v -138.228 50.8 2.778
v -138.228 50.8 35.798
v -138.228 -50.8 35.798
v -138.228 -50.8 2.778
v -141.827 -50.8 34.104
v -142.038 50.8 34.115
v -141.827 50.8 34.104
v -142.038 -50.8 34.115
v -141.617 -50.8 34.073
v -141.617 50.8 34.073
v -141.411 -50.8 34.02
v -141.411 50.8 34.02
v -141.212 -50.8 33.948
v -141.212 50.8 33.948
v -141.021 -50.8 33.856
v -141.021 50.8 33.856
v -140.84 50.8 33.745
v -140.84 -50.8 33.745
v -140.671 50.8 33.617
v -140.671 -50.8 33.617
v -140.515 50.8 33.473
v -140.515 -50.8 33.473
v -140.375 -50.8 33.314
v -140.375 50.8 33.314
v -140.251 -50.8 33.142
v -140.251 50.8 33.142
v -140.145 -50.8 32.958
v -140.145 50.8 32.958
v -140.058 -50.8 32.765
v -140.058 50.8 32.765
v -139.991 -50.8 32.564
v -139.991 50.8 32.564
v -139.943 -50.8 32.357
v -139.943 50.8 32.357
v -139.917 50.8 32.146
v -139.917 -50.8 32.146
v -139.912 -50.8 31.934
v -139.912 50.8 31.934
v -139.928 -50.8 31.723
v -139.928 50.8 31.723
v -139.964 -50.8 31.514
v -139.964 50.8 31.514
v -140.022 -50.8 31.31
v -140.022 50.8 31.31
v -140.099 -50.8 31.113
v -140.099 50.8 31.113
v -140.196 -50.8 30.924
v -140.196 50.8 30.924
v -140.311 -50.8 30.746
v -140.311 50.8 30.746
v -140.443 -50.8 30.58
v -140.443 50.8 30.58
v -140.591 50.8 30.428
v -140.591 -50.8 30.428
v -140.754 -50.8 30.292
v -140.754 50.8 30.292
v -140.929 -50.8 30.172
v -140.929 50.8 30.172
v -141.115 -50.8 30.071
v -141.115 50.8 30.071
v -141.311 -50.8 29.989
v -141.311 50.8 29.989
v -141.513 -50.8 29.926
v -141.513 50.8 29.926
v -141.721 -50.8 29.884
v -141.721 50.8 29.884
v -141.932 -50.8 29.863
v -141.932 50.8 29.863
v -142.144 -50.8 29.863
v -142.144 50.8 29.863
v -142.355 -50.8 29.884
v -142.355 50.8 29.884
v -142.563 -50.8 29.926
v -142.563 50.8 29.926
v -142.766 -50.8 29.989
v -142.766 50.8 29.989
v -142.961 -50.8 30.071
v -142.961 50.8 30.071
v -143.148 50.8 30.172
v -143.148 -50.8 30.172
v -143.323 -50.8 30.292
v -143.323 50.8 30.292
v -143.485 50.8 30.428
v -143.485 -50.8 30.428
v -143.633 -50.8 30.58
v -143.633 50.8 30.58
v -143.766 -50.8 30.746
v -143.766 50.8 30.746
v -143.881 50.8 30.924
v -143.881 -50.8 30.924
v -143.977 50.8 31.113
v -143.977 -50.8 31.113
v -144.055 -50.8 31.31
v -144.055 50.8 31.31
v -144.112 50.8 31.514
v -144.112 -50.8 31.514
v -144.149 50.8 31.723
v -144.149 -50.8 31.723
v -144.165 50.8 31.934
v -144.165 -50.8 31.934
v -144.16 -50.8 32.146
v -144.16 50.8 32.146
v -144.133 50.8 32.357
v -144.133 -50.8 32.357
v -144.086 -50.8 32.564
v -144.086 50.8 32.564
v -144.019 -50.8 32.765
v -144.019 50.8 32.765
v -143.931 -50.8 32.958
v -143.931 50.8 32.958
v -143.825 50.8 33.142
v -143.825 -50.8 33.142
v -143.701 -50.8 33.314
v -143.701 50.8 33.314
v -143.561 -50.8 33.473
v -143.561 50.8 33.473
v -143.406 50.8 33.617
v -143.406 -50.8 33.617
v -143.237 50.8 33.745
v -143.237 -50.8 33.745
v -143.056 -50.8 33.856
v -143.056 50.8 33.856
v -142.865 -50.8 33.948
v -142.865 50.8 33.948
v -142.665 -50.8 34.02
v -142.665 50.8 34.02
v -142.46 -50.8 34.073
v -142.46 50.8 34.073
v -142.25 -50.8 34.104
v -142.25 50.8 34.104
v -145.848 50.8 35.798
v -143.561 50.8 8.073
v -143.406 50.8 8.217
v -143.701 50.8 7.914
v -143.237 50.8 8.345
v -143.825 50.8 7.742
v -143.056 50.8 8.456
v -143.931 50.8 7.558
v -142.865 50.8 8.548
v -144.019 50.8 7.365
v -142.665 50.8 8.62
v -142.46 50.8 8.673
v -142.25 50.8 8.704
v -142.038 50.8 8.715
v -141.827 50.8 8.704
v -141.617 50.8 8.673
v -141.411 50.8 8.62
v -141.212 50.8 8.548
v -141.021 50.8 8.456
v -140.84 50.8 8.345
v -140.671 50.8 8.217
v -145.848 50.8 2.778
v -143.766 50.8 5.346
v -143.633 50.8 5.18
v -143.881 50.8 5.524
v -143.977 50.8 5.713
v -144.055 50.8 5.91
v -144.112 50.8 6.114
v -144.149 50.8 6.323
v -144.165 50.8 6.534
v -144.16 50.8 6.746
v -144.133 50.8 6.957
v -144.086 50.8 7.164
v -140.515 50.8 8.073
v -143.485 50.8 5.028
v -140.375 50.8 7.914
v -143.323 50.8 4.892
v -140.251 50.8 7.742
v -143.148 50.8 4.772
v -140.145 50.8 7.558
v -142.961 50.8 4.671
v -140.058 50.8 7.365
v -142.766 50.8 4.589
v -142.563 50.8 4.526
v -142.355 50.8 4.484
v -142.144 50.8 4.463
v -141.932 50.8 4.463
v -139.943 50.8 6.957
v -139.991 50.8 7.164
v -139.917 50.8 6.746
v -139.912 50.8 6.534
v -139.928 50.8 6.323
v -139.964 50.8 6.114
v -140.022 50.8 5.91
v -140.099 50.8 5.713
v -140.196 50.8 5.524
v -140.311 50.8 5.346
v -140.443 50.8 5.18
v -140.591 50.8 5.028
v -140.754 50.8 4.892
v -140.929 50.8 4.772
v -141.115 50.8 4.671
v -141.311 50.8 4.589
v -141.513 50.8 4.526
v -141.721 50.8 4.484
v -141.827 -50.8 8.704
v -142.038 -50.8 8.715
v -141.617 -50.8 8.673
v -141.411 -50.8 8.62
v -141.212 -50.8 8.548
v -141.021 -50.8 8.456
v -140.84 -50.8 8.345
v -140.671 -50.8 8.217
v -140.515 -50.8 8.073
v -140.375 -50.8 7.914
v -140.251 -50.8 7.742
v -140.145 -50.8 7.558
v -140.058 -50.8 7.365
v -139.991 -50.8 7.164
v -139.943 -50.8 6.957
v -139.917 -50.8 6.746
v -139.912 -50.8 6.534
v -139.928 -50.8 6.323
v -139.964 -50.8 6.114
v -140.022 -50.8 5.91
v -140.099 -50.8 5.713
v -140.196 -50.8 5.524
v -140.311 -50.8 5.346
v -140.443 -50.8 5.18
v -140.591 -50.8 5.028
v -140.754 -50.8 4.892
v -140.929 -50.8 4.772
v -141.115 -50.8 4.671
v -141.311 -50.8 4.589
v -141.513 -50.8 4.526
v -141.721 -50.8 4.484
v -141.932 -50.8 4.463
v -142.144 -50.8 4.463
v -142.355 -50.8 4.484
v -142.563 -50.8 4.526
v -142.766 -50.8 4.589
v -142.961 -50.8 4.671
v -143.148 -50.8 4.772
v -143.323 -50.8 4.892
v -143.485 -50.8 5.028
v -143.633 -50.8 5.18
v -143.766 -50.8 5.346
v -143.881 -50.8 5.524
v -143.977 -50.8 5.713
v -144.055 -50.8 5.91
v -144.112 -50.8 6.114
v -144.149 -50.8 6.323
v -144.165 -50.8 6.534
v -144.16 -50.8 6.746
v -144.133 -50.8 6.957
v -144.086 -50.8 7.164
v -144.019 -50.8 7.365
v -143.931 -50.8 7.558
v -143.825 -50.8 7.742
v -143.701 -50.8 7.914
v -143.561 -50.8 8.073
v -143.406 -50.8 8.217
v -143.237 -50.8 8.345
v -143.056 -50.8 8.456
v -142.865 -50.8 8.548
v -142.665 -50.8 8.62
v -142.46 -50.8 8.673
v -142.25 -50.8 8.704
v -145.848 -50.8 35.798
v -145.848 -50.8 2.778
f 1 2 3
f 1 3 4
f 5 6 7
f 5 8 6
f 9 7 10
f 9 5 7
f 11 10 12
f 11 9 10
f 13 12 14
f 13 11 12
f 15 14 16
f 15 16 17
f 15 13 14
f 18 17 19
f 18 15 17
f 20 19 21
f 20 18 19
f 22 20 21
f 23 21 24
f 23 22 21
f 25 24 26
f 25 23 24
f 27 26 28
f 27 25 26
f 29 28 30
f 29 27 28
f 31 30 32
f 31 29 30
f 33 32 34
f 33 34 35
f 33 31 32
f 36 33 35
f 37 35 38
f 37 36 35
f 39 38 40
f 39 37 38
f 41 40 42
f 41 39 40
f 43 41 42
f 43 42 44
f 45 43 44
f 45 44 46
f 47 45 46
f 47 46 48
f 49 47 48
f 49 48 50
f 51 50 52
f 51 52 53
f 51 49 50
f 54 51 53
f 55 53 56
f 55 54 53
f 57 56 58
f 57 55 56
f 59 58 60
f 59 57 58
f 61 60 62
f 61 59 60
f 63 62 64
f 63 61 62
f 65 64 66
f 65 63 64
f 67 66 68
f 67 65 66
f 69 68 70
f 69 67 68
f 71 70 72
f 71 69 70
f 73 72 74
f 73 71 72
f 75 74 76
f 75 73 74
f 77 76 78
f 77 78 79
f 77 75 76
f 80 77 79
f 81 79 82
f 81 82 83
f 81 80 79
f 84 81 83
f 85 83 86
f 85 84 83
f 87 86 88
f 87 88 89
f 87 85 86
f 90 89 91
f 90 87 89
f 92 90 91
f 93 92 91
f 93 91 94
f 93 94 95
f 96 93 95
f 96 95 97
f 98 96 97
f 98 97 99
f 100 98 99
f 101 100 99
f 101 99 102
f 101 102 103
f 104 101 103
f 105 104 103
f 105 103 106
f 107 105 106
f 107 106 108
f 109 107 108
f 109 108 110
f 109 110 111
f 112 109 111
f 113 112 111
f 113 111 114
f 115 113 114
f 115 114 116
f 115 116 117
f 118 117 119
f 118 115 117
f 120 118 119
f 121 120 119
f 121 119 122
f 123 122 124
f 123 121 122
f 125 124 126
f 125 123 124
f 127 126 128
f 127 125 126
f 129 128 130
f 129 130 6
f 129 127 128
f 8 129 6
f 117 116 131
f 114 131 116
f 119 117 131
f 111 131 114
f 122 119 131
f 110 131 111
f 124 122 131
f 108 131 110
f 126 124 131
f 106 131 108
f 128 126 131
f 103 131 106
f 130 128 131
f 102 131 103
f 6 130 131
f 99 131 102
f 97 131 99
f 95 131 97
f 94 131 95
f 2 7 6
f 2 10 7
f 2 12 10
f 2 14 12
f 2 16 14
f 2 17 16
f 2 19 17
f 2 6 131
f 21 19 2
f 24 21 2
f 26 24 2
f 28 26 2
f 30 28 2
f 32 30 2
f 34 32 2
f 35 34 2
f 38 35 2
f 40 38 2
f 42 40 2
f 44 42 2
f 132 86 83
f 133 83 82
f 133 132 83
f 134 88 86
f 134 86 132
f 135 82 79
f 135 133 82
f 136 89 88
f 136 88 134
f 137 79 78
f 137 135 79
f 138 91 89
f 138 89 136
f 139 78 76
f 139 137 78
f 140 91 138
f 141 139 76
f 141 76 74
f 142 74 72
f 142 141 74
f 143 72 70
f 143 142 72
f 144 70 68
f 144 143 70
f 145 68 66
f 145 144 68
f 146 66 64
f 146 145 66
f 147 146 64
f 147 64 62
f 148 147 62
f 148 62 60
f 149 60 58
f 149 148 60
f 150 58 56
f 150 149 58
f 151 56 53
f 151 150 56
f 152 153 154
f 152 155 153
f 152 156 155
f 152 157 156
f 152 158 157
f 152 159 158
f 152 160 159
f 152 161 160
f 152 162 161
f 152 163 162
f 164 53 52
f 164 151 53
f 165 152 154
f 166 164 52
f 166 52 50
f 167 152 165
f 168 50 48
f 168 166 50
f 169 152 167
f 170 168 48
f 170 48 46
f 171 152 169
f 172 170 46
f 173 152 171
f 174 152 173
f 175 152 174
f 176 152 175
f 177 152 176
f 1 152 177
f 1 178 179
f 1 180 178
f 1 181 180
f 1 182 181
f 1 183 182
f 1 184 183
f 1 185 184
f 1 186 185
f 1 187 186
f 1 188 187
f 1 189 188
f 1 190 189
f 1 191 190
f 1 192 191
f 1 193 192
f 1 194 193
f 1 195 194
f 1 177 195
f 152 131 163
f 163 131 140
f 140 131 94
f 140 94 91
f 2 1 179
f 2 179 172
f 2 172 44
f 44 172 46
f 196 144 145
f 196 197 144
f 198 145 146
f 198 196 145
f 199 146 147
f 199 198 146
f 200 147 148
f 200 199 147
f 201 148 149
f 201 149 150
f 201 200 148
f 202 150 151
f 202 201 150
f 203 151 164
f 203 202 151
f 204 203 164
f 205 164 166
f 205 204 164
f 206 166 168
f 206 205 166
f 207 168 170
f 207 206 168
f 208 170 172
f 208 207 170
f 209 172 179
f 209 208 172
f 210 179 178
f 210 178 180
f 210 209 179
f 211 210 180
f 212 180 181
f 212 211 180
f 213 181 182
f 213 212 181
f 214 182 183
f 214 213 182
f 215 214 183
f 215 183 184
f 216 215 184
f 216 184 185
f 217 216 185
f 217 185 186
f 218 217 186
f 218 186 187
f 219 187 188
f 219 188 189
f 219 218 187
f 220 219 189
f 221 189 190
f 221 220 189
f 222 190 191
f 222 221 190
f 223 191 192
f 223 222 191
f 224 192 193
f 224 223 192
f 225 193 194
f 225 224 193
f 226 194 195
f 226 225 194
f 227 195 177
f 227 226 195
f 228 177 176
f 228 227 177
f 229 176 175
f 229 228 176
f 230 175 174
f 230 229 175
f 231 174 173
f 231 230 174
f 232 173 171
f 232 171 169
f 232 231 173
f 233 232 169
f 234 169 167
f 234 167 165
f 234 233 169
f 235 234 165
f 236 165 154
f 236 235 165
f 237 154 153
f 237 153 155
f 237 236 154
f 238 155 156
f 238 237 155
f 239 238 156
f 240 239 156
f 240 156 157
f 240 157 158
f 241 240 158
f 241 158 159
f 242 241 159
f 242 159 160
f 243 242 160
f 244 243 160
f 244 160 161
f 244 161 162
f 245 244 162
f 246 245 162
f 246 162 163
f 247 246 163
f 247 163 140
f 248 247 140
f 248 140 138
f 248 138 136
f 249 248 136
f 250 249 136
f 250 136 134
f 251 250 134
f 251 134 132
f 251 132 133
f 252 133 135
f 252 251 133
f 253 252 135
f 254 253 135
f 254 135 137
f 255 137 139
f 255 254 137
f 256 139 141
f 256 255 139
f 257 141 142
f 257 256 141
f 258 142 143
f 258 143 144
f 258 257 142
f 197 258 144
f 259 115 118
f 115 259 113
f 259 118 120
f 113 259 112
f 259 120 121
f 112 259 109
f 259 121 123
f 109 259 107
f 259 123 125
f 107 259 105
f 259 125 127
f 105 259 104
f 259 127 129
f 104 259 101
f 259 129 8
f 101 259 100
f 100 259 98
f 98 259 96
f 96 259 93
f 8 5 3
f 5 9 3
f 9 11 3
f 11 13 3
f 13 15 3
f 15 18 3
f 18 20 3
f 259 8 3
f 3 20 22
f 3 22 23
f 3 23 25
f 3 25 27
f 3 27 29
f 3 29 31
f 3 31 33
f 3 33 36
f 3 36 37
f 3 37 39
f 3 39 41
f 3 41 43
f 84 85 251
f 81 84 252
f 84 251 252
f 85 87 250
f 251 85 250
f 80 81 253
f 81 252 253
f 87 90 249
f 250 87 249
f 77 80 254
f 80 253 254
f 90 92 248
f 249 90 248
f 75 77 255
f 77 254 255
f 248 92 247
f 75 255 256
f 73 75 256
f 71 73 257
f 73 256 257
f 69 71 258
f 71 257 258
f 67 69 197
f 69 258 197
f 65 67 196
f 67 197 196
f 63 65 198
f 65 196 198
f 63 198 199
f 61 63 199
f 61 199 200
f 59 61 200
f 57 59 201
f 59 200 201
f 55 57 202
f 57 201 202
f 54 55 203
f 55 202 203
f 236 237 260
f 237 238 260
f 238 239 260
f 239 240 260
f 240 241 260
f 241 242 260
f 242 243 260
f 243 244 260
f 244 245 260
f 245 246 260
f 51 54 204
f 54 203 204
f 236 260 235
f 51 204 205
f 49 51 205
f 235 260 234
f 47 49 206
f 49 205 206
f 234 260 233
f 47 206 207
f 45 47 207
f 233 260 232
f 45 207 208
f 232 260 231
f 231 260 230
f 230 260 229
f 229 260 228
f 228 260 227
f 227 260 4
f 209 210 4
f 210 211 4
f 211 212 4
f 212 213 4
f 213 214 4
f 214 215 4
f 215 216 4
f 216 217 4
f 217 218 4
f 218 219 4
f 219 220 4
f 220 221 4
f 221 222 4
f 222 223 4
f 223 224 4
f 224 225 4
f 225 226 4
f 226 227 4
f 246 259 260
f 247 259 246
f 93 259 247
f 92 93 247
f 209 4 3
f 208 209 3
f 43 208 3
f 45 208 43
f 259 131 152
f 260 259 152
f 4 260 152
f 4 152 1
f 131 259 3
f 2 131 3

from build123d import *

# Parameters (mm, degrees)
SKETCH1_W           = 7.62
SKETCH1_H           = 33.02
SKETCH1_R           = 2.12725
BOSS_EXTRUDE1_DEPTH = 50.8


with BuildPart() as part:
    # Sketch1 → Boss-Extrude1 (new, symmetric)
    with BuildSketch(Plane(origin=(0, 0, 0), x_dir=(1, 0, 0), z_dir=(0, 1, 0))):
        with Locations((-142.038308124, -19.2875)):
            Rectangle(SKETCH1_W, SKETCH1_H)
        with Locations(Location((-142.038308124, -6.5875, 0), (0, 0, 270))):
            Circle(SKETCH1_R, mode=Mode.SUBTRACT)
        with Locations(Location((-142.038308124, -31.9875, 0), (0, 0, 270))):
            Circle(SKETCH1_R, mode=Mode.SUBTRACT)
    extrude(amount=BOSS_EXTRUDE1_DEPTH, both=True)


solid = part.part
